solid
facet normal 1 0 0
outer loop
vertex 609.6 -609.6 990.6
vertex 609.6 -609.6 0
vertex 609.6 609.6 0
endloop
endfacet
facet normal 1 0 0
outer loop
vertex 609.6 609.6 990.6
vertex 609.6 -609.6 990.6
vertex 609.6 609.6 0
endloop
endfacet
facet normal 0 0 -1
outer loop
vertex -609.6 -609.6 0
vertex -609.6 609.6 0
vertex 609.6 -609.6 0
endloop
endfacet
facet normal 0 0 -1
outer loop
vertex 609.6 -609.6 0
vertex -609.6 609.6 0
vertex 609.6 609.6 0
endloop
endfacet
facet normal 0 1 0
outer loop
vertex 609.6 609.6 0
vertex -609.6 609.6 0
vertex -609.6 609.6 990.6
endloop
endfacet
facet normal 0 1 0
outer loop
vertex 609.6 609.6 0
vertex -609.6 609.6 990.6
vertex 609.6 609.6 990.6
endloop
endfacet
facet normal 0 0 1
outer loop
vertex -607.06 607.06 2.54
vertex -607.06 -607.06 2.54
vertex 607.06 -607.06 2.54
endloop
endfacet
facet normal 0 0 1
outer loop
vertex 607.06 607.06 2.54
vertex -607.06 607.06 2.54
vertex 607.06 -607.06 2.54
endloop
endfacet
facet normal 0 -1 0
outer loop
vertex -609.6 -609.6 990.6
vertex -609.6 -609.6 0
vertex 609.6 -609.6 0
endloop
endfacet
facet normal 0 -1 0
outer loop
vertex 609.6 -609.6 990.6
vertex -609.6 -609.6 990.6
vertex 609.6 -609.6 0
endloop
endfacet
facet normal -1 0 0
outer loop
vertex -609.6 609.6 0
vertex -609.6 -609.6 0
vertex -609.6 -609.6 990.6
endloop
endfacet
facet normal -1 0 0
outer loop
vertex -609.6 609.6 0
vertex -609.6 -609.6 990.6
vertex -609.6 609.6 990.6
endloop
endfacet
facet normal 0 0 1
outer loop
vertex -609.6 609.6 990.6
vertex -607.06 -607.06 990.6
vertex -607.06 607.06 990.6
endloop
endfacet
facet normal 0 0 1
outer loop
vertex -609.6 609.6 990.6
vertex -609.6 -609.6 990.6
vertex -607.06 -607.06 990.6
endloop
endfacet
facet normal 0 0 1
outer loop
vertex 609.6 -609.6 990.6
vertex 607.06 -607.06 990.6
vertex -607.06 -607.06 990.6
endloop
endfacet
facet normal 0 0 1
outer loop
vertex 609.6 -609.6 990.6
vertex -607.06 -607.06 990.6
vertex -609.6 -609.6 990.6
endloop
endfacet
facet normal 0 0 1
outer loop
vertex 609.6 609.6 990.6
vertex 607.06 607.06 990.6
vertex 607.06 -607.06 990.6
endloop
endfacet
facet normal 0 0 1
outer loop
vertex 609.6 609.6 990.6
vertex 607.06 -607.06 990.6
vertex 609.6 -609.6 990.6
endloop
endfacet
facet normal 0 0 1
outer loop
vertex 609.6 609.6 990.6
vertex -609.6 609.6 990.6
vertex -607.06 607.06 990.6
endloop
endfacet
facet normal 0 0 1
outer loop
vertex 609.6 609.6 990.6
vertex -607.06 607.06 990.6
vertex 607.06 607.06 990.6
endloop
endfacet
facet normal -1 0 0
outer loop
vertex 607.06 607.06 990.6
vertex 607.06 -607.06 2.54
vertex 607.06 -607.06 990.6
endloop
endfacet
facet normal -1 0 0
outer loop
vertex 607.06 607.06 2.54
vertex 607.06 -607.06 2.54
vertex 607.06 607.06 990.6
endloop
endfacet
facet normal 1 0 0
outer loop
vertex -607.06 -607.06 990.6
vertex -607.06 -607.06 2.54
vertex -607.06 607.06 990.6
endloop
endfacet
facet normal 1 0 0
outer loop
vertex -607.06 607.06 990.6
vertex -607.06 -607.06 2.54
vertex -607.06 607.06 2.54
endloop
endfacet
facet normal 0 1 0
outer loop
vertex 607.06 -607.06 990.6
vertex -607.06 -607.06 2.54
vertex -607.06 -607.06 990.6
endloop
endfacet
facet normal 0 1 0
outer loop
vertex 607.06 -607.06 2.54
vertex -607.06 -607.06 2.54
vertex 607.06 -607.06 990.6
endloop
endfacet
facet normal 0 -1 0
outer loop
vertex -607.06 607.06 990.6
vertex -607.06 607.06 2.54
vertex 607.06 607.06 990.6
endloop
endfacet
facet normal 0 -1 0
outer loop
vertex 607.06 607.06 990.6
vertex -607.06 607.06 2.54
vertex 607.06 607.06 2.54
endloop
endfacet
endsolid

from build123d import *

# Parameters (mm, degrees)
F0_W     = 1219.2
F0_H     = 1219.2
F1_DEPTH = 990.6
F2_T     = -2.54


# Not quite as in the source:
# - the program builds the solid bodies; features that only make, move or delete a surface that nothing else refers to are left out


with BuildPart() as f1:
    # F0 (on Top) → F1 (new body)
    with BuildSketch(Plane.XY):
        Rectangle(F0_W, F0_H)
    extrude(amount=F1_DEPTH)

    # F2
    f2_openings = [f1.faces().sort_by_distance(p)[0] for p in [
        (0, 0, 990.6),
    ]]
    offset(amount=F2_T, openings=f2_openings)


solid = f1.part
